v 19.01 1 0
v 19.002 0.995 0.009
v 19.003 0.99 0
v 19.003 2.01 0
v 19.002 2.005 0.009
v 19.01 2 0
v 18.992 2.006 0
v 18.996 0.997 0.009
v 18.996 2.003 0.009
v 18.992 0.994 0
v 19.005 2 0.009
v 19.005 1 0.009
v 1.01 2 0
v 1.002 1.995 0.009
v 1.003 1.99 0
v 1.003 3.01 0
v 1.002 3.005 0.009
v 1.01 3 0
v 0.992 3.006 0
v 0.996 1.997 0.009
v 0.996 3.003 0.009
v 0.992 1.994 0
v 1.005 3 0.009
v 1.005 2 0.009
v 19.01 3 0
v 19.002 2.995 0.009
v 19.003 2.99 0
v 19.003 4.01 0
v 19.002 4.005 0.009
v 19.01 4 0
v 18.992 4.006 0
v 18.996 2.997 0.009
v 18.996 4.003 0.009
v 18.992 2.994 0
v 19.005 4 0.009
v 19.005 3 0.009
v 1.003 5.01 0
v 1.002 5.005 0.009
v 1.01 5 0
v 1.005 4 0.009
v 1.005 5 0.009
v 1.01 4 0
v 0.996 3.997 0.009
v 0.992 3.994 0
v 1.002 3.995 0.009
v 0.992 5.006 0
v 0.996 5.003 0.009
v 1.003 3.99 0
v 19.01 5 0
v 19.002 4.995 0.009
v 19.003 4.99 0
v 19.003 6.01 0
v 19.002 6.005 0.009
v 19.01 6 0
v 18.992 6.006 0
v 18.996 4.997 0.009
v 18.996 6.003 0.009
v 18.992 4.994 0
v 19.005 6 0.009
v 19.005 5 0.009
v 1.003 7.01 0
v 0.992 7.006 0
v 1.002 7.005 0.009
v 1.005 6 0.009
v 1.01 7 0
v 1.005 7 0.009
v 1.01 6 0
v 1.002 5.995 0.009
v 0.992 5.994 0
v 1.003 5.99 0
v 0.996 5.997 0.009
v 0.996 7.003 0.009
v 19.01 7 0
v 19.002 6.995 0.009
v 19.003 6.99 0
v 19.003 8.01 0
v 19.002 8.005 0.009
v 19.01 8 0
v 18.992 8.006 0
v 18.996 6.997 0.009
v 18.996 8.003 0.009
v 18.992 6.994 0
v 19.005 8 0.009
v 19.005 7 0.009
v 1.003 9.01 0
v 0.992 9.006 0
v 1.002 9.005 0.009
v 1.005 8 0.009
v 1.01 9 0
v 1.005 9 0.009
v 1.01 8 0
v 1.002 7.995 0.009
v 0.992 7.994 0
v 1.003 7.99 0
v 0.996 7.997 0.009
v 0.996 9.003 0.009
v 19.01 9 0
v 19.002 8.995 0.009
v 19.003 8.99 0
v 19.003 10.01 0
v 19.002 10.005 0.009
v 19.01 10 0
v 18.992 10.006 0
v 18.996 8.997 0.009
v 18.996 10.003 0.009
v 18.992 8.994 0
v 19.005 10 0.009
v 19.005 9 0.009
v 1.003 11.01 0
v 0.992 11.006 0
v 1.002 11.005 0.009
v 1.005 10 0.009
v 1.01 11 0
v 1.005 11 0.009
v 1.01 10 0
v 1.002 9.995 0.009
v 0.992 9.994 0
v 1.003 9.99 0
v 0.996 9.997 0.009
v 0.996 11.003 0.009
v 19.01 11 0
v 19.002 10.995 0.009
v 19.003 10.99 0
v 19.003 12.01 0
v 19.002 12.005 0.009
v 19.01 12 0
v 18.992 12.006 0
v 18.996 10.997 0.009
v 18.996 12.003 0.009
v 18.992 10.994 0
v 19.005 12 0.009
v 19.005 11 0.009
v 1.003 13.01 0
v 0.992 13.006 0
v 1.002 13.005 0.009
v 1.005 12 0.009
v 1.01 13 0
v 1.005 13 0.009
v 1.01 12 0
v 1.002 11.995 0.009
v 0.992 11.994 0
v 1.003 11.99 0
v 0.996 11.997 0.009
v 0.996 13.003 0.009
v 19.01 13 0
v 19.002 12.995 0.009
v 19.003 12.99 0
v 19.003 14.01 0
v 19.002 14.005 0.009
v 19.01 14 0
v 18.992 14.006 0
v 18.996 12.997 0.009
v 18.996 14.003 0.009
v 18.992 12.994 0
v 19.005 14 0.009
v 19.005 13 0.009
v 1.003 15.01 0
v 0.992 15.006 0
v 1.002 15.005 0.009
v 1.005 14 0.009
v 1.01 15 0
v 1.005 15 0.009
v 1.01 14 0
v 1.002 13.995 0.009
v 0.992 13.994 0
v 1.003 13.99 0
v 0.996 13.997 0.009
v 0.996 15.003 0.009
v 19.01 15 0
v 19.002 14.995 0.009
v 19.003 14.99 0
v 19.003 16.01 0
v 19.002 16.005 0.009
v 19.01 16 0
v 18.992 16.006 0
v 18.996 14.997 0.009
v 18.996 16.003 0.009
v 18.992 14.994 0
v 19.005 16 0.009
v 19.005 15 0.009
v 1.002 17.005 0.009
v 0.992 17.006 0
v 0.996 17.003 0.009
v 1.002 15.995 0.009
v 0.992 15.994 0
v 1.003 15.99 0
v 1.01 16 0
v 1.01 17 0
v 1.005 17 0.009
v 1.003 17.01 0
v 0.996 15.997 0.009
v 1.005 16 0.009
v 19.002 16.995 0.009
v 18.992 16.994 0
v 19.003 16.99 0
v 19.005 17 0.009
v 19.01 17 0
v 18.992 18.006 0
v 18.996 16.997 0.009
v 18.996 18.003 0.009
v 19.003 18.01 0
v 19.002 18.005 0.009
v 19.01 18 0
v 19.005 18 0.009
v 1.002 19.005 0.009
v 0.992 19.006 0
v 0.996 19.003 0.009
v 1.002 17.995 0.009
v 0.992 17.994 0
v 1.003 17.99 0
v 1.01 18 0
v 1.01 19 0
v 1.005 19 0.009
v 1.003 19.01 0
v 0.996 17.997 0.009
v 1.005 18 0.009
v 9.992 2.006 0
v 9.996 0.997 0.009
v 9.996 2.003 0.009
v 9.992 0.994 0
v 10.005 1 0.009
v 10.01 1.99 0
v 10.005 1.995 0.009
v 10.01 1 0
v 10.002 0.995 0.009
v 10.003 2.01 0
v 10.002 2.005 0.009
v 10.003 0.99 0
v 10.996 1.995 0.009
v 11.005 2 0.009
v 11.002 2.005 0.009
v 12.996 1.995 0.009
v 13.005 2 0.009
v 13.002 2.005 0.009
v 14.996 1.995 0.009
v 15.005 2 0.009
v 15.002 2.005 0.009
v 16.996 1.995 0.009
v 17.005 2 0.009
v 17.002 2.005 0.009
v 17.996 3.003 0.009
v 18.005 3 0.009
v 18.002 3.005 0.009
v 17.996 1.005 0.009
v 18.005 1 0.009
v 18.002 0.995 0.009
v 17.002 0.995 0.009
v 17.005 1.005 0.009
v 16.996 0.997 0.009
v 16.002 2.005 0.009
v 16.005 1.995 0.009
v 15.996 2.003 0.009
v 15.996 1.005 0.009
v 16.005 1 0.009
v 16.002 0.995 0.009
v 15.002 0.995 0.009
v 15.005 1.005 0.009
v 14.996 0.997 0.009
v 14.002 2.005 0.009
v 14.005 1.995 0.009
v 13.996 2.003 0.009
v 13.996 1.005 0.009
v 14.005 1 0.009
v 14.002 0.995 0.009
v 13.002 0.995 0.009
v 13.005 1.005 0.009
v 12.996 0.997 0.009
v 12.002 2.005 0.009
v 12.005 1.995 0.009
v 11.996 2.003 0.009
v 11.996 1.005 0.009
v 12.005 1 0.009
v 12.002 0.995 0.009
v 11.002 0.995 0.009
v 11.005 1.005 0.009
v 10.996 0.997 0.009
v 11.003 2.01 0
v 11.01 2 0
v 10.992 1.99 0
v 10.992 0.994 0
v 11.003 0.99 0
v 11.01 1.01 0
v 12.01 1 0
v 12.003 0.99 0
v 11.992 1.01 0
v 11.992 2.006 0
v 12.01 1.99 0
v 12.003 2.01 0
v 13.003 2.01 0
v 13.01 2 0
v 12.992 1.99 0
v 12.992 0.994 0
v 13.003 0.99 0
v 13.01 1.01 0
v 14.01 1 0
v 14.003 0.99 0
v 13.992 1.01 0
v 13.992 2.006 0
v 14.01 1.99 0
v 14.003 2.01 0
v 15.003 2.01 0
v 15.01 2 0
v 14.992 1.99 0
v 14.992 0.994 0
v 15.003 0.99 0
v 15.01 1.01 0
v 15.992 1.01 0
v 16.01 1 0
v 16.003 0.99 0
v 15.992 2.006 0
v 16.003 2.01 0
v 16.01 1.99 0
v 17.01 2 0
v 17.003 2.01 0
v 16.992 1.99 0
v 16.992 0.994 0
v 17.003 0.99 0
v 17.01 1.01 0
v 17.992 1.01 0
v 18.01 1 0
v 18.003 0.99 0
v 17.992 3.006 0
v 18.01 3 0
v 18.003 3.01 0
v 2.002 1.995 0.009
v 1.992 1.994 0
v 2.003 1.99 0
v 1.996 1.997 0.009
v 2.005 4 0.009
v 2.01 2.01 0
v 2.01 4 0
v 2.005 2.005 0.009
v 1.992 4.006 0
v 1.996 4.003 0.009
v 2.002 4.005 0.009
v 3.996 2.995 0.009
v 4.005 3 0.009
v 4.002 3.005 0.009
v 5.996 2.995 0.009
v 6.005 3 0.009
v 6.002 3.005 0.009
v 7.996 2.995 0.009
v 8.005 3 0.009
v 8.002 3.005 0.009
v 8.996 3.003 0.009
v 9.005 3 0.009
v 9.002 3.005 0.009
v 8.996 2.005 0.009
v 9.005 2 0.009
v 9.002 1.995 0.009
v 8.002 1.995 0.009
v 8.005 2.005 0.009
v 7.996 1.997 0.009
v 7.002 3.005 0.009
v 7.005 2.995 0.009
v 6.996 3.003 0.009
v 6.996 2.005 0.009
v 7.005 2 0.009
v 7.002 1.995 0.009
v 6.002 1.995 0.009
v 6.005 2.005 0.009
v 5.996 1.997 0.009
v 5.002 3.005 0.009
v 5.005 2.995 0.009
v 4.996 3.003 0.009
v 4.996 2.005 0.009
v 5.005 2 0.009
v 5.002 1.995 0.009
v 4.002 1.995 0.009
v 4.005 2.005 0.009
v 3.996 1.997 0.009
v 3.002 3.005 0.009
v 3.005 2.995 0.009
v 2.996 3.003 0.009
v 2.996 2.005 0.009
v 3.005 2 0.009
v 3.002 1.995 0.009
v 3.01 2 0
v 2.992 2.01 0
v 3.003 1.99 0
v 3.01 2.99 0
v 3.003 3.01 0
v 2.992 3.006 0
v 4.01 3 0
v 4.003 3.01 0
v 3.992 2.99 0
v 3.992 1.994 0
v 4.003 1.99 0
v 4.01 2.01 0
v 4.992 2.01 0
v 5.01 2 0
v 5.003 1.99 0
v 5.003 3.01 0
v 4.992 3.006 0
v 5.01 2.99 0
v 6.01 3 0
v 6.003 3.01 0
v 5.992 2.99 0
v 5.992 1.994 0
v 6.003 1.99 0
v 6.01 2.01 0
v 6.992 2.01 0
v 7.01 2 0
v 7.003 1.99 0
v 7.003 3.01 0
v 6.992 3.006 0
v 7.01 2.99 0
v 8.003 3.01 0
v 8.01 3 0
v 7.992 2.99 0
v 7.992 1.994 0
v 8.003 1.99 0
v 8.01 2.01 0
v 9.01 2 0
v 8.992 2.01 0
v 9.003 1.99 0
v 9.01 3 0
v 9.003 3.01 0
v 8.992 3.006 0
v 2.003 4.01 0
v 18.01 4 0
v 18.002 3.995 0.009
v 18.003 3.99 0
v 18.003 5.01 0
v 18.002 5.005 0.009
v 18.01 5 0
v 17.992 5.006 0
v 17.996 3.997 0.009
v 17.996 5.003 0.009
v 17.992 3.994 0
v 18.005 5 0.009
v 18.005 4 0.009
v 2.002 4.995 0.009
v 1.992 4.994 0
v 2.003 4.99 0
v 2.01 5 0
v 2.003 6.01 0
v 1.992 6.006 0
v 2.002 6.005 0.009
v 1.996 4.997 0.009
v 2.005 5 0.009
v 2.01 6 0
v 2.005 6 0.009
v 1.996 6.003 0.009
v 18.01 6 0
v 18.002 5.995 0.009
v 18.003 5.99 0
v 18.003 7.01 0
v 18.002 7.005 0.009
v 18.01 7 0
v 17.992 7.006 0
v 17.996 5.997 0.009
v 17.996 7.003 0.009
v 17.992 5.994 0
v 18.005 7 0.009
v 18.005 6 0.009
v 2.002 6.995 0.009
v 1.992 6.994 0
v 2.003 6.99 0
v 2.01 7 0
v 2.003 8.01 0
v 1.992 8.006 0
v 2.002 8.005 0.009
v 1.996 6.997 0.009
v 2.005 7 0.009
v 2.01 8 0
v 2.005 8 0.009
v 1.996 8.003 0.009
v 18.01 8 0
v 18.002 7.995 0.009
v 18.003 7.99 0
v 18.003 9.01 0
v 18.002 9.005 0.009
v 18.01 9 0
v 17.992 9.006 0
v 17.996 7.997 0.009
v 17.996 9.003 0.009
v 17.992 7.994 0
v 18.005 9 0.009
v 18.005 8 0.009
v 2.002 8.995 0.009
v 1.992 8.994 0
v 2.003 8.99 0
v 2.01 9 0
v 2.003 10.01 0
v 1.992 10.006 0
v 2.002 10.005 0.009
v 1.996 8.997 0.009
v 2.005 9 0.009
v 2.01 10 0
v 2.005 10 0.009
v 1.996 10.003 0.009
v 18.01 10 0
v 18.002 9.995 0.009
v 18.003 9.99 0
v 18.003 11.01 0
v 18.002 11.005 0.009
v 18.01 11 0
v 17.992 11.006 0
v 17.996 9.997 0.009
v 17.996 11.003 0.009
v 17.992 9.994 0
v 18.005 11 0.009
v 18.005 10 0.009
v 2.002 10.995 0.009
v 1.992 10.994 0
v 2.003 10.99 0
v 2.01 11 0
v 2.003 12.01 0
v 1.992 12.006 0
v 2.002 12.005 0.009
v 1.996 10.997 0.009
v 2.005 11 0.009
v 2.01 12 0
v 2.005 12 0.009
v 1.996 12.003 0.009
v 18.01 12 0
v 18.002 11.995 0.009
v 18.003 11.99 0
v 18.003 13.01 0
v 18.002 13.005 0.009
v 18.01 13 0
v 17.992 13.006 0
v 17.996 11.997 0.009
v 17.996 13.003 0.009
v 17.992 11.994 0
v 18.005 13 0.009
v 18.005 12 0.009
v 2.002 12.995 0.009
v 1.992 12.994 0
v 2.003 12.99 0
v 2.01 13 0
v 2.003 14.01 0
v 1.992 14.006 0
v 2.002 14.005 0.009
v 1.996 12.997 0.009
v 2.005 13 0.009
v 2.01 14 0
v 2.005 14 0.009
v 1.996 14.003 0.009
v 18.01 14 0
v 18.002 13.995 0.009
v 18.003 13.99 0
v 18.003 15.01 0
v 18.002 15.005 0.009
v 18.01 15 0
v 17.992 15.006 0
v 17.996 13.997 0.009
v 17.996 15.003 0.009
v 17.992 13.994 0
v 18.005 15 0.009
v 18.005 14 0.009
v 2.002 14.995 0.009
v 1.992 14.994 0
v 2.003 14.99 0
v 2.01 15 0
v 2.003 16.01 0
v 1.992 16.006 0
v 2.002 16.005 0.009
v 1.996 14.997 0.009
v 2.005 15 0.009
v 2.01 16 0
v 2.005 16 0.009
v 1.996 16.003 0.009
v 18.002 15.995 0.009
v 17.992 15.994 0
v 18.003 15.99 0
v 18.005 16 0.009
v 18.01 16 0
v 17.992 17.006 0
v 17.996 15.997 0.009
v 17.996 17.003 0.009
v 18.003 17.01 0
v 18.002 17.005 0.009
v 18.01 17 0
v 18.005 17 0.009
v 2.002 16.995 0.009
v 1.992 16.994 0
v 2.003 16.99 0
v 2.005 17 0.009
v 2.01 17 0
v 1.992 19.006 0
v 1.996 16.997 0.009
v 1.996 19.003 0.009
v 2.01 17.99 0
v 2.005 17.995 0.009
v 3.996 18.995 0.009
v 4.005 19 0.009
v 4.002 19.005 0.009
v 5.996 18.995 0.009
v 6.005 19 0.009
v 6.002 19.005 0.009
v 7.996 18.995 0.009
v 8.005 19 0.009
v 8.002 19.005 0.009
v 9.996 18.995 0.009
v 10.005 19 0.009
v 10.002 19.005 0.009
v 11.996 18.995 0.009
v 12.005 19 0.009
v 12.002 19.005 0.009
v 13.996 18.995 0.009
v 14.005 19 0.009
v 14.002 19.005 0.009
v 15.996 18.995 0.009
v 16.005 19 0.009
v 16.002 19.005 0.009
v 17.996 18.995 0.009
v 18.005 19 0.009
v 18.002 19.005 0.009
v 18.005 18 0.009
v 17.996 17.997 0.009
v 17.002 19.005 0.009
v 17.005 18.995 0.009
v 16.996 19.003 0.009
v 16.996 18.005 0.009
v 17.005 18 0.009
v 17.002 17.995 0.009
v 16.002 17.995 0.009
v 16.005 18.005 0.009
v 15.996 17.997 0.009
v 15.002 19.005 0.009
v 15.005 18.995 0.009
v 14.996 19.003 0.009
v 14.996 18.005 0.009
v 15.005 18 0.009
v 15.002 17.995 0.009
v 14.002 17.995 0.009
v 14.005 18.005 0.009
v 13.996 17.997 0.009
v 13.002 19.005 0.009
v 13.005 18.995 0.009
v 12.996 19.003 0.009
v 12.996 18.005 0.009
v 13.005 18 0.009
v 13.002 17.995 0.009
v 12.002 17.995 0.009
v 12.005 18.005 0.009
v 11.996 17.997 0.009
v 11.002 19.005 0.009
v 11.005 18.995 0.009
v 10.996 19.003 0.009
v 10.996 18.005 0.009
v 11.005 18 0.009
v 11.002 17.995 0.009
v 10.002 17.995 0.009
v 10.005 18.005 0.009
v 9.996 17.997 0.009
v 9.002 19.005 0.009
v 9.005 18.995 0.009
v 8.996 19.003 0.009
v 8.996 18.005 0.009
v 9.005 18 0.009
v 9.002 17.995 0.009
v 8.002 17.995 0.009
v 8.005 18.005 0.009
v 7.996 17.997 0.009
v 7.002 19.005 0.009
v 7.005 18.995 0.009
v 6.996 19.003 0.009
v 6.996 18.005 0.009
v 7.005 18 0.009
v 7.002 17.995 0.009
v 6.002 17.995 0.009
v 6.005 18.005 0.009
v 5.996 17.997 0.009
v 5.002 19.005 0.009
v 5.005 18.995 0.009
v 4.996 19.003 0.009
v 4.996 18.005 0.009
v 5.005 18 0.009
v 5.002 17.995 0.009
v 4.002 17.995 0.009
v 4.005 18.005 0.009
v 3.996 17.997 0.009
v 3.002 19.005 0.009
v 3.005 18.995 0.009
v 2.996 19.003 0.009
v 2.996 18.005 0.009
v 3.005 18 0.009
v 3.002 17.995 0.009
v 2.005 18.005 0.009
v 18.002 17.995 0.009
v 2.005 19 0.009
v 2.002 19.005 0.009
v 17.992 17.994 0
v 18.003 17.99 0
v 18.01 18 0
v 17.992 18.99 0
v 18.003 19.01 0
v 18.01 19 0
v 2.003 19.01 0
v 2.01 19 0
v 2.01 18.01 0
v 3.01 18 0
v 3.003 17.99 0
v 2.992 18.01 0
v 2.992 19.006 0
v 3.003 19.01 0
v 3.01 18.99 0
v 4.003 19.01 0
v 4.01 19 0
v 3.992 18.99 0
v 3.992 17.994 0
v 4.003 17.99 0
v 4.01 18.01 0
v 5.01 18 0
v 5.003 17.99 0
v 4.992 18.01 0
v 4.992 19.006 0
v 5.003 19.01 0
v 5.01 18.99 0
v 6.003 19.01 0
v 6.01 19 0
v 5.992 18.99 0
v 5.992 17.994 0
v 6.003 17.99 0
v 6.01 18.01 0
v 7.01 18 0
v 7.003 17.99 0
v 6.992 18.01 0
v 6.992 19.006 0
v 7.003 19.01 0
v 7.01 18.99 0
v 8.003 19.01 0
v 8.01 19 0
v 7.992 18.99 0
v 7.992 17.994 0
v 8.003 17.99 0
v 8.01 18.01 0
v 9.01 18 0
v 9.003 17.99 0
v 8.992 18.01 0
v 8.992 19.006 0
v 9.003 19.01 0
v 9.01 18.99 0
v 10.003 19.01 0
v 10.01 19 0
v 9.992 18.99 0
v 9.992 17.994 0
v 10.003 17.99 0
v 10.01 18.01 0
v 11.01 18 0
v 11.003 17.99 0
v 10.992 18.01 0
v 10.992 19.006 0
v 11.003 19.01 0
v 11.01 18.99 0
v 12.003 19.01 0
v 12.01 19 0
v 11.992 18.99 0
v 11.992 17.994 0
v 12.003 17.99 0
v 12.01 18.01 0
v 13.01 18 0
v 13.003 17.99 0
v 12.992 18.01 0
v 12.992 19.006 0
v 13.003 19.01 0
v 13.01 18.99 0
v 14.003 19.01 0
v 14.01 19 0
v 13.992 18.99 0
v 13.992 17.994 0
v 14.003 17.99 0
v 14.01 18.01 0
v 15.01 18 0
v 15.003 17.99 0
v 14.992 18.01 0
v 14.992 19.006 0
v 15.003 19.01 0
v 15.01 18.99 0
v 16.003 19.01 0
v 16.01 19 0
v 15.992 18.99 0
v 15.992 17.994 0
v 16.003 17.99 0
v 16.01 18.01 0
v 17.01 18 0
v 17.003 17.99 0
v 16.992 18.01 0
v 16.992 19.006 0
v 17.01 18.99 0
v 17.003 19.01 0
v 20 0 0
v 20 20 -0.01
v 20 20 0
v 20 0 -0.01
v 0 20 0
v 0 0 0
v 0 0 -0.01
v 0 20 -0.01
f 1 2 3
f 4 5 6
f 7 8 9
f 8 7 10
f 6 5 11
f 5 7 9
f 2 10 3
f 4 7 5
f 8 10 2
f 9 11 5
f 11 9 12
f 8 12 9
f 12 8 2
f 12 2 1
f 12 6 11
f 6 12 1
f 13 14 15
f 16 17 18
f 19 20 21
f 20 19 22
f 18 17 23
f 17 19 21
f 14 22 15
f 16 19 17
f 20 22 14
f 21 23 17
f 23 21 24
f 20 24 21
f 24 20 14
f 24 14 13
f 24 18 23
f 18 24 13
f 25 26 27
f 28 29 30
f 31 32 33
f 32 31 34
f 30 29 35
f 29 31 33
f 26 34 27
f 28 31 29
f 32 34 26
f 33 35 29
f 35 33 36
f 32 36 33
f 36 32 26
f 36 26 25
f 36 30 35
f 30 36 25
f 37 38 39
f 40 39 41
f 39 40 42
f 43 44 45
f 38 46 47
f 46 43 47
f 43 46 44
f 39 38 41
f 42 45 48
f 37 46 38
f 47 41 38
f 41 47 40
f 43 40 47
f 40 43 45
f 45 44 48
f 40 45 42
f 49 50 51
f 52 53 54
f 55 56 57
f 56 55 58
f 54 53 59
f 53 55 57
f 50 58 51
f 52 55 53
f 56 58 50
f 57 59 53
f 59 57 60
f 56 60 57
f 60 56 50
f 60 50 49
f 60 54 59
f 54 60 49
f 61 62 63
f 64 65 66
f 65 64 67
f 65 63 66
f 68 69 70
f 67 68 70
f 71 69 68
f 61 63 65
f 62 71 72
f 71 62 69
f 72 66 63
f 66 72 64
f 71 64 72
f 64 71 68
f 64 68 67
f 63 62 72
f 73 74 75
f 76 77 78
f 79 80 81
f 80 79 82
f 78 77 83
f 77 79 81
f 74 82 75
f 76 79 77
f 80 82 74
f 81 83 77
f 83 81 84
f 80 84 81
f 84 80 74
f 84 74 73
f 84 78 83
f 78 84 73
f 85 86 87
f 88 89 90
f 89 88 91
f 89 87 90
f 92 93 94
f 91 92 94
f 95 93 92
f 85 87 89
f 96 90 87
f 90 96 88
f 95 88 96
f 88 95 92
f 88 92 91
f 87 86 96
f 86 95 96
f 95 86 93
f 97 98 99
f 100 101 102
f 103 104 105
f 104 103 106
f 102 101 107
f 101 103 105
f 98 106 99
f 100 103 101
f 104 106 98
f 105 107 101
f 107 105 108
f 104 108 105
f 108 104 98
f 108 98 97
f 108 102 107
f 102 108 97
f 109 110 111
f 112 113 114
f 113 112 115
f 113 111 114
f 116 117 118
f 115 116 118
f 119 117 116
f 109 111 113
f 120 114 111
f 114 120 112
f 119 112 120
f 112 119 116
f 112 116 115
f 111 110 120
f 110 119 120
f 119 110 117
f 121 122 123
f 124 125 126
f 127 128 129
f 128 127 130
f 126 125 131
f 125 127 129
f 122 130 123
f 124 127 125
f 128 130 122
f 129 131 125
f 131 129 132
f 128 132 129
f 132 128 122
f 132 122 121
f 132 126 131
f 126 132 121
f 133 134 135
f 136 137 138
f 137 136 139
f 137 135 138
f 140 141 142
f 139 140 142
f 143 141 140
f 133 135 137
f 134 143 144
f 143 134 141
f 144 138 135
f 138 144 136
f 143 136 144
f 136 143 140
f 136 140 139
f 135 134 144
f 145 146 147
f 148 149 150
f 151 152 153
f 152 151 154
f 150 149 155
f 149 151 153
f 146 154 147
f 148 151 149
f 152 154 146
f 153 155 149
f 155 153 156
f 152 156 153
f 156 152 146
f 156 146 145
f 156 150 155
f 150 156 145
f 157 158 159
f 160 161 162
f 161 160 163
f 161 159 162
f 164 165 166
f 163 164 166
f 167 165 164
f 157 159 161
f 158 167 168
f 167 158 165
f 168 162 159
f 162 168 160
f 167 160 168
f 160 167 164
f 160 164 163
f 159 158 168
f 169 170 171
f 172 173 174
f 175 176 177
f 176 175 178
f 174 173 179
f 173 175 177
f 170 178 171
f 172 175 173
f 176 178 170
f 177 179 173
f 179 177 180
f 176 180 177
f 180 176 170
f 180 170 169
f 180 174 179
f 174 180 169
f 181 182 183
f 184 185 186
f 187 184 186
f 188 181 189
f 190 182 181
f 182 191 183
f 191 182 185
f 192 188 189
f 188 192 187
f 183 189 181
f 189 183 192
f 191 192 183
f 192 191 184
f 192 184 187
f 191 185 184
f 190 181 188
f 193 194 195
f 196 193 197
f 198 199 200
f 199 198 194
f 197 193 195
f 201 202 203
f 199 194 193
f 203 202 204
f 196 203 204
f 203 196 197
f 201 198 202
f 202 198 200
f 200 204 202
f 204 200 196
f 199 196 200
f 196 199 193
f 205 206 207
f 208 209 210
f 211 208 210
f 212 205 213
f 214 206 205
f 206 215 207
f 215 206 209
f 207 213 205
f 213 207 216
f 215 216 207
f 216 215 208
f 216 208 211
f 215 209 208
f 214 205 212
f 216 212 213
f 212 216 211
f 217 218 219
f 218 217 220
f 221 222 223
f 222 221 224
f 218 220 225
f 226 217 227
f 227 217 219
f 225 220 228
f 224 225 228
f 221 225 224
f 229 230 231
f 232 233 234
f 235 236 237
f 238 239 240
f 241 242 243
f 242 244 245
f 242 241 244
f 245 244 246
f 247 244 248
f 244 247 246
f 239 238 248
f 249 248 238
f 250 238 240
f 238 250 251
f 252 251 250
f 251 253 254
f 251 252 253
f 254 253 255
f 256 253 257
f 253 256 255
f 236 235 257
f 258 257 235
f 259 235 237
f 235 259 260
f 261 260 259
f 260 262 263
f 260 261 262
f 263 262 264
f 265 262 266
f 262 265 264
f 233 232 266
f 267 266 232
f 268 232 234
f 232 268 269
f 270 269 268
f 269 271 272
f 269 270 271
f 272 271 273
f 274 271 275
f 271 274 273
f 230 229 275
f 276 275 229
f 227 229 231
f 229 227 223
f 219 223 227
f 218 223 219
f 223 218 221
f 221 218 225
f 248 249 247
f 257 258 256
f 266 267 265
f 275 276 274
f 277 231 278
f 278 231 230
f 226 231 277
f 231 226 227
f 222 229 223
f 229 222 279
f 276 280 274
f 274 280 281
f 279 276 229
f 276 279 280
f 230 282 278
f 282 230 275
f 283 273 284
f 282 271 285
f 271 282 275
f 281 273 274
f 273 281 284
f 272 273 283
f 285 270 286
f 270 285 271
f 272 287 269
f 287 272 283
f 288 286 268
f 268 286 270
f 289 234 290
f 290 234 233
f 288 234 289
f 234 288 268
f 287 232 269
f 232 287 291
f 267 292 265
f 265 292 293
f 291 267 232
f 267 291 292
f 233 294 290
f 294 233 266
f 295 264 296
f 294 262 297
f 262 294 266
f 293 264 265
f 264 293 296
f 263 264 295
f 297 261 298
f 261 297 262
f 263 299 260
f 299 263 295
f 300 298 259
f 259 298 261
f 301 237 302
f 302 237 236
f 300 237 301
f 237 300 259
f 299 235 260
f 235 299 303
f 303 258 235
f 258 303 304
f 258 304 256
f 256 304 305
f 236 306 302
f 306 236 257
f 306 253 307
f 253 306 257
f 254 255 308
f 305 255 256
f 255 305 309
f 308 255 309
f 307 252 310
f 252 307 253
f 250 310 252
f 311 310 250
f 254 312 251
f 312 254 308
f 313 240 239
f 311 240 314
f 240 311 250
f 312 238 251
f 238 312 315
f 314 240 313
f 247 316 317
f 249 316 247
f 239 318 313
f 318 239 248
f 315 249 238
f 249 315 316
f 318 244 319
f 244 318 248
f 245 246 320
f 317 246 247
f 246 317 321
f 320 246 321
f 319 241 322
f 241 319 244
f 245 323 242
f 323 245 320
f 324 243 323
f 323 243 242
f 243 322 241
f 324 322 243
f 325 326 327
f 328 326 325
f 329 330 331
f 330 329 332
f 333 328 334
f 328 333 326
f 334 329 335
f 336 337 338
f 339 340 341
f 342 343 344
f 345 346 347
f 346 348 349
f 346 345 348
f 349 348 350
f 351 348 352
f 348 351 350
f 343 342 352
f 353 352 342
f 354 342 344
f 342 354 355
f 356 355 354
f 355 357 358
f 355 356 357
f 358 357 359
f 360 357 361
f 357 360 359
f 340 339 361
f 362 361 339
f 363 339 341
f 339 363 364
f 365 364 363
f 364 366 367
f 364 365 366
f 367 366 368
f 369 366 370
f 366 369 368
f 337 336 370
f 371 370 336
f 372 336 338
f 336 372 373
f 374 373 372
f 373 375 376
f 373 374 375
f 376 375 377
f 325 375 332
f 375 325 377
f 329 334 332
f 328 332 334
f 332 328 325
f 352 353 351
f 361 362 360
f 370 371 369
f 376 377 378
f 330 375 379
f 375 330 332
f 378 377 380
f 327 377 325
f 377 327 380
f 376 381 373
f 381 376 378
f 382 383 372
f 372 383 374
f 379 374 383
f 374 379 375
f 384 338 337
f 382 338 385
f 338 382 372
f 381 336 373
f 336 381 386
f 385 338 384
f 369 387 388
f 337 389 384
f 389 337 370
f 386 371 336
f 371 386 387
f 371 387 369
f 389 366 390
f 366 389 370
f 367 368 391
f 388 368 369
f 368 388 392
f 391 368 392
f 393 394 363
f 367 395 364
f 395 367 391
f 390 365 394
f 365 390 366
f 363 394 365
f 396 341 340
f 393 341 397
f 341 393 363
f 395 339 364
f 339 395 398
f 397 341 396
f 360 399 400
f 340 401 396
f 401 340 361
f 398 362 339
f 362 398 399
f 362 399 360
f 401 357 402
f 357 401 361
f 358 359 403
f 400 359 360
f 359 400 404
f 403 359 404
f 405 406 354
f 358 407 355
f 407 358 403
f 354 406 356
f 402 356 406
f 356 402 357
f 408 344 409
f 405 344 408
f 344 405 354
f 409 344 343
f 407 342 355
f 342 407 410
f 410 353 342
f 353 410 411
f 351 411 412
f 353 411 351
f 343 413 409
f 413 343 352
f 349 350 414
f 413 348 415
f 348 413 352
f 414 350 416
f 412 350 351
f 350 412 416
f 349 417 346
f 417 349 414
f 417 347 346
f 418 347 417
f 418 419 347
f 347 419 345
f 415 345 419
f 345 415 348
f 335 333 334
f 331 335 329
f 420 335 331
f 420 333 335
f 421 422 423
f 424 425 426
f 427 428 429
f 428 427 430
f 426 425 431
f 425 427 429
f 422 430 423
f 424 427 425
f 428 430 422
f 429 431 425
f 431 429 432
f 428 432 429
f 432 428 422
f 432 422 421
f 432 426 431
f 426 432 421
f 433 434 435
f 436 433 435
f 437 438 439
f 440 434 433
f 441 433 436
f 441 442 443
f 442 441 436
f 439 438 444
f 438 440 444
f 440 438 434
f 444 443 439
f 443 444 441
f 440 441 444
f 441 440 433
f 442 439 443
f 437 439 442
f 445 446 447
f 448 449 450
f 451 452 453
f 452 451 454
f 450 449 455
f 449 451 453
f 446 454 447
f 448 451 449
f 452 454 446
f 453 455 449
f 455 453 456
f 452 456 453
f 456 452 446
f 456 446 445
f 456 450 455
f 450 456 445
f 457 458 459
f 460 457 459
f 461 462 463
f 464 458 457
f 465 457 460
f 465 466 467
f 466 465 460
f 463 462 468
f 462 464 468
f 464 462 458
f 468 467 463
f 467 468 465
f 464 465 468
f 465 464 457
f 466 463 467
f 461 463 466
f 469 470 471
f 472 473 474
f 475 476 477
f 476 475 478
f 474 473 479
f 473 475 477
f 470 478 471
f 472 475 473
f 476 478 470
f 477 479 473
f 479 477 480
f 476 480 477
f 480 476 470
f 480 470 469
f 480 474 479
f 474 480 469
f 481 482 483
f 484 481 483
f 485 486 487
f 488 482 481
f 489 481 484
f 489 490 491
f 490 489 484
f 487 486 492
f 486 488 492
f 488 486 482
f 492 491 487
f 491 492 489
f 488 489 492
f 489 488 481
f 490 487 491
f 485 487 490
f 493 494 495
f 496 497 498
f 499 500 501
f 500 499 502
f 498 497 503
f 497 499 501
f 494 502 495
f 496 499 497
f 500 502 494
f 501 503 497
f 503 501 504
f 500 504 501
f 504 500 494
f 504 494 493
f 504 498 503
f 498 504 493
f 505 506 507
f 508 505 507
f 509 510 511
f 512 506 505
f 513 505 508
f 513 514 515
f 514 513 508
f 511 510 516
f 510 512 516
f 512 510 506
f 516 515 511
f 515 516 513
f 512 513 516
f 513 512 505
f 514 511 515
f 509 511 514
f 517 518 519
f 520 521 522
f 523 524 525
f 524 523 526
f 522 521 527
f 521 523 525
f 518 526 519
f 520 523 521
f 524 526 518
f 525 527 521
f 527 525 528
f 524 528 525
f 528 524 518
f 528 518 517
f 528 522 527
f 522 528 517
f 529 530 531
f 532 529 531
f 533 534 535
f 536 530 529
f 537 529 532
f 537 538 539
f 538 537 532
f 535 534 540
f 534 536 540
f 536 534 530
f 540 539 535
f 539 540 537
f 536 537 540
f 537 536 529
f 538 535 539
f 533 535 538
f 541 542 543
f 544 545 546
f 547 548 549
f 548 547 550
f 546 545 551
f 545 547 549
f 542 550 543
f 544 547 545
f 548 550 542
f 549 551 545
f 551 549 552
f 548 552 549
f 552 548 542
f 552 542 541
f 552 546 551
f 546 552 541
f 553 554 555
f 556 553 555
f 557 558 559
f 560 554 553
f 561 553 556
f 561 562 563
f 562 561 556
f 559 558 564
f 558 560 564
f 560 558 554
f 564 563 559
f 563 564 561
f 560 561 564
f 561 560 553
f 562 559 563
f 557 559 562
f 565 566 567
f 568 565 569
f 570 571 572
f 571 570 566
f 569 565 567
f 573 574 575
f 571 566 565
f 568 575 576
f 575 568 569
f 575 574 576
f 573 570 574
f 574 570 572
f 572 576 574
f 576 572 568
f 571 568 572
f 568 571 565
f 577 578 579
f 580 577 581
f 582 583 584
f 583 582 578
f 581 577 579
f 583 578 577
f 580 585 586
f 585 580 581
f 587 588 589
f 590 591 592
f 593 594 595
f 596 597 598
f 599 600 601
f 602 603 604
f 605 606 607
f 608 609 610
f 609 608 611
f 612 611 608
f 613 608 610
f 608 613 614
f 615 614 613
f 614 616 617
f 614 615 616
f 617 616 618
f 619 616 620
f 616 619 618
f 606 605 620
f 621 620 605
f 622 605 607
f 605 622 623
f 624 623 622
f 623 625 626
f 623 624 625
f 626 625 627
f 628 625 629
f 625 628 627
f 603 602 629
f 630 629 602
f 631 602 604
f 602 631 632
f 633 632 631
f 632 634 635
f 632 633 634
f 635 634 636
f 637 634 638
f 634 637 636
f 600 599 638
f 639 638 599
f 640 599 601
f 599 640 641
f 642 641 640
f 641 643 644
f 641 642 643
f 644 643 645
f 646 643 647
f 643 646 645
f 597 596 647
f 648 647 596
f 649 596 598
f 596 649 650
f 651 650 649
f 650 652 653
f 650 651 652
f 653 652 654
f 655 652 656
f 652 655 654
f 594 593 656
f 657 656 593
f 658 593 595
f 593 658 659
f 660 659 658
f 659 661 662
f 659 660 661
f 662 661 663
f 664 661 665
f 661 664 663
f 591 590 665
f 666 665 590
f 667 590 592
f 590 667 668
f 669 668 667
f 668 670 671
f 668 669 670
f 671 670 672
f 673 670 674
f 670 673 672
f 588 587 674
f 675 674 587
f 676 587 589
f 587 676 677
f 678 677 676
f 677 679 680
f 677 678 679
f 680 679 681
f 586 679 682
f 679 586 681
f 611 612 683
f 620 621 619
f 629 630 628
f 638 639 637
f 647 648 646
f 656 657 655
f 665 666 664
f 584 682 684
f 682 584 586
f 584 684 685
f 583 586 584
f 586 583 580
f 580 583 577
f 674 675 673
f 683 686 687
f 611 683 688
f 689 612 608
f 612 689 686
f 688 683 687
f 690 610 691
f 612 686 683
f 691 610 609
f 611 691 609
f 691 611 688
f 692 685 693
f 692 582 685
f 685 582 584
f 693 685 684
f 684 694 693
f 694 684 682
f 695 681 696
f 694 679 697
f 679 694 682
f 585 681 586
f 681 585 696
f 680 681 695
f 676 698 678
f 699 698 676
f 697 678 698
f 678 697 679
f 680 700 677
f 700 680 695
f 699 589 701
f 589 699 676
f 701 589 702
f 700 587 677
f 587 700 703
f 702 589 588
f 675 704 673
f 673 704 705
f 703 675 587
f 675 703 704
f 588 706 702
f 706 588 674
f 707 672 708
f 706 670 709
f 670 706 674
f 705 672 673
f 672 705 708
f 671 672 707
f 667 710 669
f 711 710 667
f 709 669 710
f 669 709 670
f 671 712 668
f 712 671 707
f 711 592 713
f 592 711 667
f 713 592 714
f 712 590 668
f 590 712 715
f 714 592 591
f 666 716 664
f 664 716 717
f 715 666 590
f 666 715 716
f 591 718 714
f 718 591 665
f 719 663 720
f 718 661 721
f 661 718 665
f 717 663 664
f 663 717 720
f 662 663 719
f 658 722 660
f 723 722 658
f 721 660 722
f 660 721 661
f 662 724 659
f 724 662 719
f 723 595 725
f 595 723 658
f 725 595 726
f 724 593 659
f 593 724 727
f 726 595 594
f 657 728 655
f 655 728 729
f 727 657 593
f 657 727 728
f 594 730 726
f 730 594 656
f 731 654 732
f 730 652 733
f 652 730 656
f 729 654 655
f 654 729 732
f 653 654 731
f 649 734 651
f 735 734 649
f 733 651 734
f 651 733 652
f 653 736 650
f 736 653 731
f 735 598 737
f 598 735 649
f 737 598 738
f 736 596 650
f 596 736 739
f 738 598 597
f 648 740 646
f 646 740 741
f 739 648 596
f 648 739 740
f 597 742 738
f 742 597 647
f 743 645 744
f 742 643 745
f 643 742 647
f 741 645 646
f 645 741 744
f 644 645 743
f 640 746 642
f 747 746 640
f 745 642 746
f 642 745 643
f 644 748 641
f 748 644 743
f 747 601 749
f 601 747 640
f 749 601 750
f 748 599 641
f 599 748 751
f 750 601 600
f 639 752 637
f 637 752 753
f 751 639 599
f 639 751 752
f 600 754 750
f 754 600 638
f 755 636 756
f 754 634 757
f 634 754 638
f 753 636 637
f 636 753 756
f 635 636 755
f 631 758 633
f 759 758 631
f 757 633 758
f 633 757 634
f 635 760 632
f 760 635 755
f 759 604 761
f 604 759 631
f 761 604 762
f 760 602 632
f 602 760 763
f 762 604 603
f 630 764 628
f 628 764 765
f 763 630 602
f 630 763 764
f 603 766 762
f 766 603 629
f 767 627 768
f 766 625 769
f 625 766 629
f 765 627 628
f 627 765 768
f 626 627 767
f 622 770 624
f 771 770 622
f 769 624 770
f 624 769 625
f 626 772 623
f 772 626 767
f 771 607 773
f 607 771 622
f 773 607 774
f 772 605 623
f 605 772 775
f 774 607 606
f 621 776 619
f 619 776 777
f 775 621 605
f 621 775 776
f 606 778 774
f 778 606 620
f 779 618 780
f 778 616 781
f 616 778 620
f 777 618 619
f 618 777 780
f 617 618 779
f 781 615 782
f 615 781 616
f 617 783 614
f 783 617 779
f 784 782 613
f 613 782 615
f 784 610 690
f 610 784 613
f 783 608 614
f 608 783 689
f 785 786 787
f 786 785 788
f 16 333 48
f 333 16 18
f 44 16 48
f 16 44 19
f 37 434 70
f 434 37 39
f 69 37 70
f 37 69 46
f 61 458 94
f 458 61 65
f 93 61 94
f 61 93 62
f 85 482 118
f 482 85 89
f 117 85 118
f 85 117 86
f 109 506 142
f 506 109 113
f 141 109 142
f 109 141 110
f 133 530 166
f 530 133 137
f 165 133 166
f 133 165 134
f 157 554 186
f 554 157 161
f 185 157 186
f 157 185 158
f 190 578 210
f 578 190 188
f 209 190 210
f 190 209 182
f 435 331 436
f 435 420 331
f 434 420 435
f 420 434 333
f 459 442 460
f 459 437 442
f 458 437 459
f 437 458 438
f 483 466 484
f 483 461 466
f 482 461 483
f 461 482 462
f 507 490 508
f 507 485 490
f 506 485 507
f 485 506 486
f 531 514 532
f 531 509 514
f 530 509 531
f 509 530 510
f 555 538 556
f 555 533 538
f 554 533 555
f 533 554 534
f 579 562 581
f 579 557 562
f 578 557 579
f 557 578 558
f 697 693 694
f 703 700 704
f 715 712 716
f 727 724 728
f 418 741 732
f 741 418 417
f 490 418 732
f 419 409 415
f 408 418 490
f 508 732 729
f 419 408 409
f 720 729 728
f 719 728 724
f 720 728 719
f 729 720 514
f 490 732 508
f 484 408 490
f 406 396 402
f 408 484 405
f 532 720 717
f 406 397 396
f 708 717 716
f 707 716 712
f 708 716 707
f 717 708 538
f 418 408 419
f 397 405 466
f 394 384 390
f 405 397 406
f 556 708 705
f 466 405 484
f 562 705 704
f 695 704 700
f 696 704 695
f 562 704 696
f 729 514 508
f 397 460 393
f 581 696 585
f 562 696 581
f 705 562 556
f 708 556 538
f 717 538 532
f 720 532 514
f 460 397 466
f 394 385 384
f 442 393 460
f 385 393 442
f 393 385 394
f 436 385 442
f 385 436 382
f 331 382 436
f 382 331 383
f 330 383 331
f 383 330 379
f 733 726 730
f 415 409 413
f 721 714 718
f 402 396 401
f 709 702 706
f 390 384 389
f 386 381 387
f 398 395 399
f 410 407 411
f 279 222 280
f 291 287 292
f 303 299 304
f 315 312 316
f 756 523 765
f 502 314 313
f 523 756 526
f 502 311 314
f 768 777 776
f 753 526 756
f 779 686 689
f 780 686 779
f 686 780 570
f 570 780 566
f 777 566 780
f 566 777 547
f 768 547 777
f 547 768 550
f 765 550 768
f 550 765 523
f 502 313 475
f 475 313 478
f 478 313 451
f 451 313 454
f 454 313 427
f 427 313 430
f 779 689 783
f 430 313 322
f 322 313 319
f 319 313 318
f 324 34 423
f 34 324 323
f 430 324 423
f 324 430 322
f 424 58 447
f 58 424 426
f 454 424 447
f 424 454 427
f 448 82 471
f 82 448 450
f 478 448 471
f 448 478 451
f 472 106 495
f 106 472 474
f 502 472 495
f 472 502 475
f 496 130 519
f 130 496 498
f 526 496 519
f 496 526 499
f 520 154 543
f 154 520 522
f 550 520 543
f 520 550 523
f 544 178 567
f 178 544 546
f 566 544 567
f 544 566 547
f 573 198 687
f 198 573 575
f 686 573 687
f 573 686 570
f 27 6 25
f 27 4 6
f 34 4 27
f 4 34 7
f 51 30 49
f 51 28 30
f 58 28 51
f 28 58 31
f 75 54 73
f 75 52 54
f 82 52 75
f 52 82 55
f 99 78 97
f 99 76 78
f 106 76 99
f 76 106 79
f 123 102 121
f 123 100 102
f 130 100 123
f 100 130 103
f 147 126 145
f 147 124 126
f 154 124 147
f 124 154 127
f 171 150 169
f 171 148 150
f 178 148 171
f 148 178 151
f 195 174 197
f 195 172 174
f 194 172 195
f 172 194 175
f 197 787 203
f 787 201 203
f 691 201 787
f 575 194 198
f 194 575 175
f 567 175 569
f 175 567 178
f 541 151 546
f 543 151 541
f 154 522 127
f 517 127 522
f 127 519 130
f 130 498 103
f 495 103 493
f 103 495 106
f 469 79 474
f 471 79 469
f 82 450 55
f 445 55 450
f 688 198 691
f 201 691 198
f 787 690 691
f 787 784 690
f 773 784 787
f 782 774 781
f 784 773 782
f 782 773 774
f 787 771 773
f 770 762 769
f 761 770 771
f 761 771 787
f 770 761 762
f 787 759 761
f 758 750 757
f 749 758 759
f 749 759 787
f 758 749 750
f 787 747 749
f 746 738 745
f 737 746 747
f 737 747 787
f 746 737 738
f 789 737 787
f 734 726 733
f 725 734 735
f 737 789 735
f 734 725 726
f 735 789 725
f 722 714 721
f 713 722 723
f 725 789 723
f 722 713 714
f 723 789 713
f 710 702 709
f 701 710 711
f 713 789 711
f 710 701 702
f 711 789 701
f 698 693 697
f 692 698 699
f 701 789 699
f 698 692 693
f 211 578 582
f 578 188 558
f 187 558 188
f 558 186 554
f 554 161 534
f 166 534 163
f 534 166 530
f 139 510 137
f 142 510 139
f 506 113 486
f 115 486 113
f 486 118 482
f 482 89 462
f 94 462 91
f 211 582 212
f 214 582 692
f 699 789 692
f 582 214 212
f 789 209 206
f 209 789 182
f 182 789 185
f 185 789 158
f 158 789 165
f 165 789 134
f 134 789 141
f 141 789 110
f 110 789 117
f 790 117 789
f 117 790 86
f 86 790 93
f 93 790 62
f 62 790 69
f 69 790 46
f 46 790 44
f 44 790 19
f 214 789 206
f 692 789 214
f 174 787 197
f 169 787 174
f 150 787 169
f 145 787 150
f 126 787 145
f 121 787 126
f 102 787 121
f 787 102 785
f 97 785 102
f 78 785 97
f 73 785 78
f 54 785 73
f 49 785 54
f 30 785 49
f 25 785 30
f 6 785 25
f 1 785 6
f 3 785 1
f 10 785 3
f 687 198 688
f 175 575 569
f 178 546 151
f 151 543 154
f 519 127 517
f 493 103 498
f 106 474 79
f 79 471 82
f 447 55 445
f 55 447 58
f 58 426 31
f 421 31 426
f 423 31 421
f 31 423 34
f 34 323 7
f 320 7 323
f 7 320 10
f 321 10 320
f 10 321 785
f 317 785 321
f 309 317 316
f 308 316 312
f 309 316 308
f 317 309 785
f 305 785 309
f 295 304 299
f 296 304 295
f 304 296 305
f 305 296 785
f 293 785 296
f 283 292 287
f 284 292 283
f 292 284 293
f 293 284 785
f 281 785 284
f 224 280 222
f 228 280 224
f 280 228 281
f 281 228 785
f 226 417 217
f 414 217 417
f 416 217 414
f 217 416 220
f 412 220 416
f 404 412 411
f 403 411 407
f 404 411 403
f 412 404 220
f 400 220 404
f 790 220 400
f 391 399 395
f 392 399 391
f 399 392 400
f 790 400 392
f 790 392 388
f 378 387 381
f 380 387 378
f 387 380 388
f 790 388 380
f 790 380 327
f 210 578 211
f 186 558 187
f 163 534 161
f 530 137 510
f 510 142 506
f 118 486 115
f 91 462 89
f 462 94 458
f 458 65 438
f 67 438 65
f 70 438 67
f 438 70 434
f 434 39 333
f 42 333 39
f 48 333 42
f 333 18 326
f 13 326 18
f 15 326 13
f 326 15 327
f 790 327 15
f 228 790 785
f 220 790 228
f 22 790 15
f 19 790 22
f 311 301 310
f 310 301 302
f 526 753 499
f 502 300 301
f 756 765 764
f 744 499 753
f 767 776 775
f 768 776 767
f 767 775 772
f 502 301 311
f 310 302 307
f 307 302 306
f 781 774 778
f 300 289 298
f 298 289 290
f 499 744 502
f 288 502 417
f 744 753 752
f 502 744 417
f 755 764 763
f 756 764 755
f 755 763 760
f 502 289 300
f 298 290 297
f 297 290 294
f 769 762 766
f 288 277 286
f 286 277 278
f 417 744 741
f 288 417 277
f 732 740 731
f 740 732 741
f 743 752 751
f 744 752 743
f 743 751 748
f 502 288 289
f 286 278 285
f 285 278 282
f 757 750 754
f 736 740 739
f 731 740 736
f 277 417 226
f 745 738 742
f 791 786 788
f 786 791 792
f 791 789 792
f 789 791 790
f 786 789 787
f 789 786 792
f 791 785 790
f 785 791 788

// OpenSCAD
hull(){
    translate([19, 1]) sphere(0.01);
    translate([19, 2]) sphere(0.01);
}
hull(){
    translate([1, 2]) sphere(0.01);
    translate([1, 3]) sphere(0.01);
}
hull(){
    translate([19, 3]) sphere(0.01);
    translate([19, 4]) sphere(0.01);
}
hull(){
    translate([1, 4]) sphere(0.01);
    translate([1, 5]) sphere(0.01);
}
hull(){
    translate([19, 5]) sphere(0.01);
    translate([19, 6]) sphere(0.01);
}
hull(){
    translate([1, 6]) sphere(0.01);
    translate([1, 7]) sphere(0.01);
}
hull(){
    translate([19, 7]) sphere(0.01);
    translate([19, 8]) sphere(0.01);
}
hull(){
    translate([1, 8]) sphere(0.01);
    translate([1, 9]) sphere(0.01);
}
hull(){
    translate([19, 9]) sphere(0.01);
    translate([19, 10]) sphere(0.01);
}
hull(){
    translate([1, 10]) sphere(0.01);
    translate([1, 11]) sphere(0.01);
}
hull(){
    translate([19, 11]) sphere(0.01);
    translate([19, 12]) sphere(0.01);
}
hull(){
    translate([1, 12]) sphere(0.01);
    translate([1, 13]) sphere(0.01);
}
hull(){
    translate([19, 13]) sphere(0.01);
    translate([19, 14]) sphere(0.01);
}
hull(){
    translate([1, 14]) sphere(0.01);
    translate([1, 15]) sphere(0.01);
}
hull(){
    translate([19, 15]) sphere(0.01);
    translate([19, 16]) sphere(0.01);
}
hull(){
    translate([1, 16]) sphere(0.01);
    translate([1, 17]) sphere(0.01);
}
hull(){
    translate([19, 17]) sphere(0.01);
    translate([19, 18]) sphere(0.01);
}
hull(){
    translate([1, 18]) sphere(0.01);
    translate([1, 19]) sphere(0.01);
}
hull(){
    translate([10, 1]) sphere(0.01);
    translate([10, 2]) sphere(0.01);
}
hull(){
    translate([10, 2]) sphere(0.01);
    translate([11, 2]) sphere(0.01);
}
hull(){
    translate([11, 2]) sphere(0.01);
    translate([11, 1]) sphere(0.01);
}
hull(){
    translate([11, 1]) sphere(0.01);
    translate([12, 1]) sphere(0.01);
}
hull(){
    translate([12, 1]) sphere(0.01);
    translate([12, 2]) sphere(0.01);
}
hull(){
    translate([12, 2]) sphere(0.01);
    translate([13, 2]) sphere(0.01);
}
hull(){
    translate([13, 2]) sphere(0.01);
    translate([13, 1]) sphere(0.01);
}
hull(){
    translate([13, 1]) sphere(0.01);
    translate([14, 1]) sphere(0.01);
}
hull(){
    translate([14, 1]) sphere(0.01);
    translate([14, 2]) sphere(0.01);
}
hull(){
    translate([14, 2]) sphere(0.01);
    translate([15, 2]) sphere(0.01);
}
hull(){
    translate([15, 2]) sphere(0.01);
    translate([15, 1]) sphere(0.01);
}
hull(){
    translate([15, 1]) sphere(0.01);
    translate([16, 1]) sphere(0.01);
}
hull(){
    translate([16, 1]) sphere(0.01);
    translate([16, 2]) sphere(0.01);
}
hull(){
    translate([16, 2]) sphere(0.01);
    translate([17, 2]) sphere(0.01);
}
hull(){
    translate([17, 2]) sphere(0.01);
    translate([17, 1]) sphere(0.01);
}
hull(){
    translate([17, 1]) sphere(0.01);
    translate([18, 1]) sphere(0.01);
}
hull(){
    translate([18, 1]) sphere(0.01);
    translate([18, 2]) sphere(0.01);
}
hull(){
    translate([18, 2]) sphere(0.01);
    translate([18, 3]) sphere(0.01);
}
hull(){
    translate([2, 3]) sphere(0.01);
    translate([2, 2]) sphere(0.01);
}
hull(){
    translate([2, 2]) sphere(0.01);
    translate([3, 2]) sphere(0.01);
}
hull(){
    translate([3, 2]) sphere(0.01);
    translate([3, 3]) sphere(0.01);
}
hull(){
    translate([3, 3]) sphere(0.01);
    translate([4, 3]) sphere(0.01);
}
hull(){
    translate([4, 3]) sphere(0.01);
    translate([4, 2]) sphere(0.01);
}
hull(){
    translate([4, 2]) sphere(0.01);
    translate([5, 2]) sphere(0.01);
}
hull(){
    translate([5, 2]) sphere(0.01);
    translate([5, 3]) sphere(0.01);
}
hull(){
    translate([5, 3]) sphere(0.01);
    translate([6, 3]) sphere(0.01);
}
hull(){
    translate([6, 3]) sphere(0.01);
    translate([6, 2]) sphere(0.01);
}
hull(){
    translate([6, 2]) sphere(0.01);
    translate([7, 2]) sphere(0.01);
}
hull(){
    translate([7, 2]) sphere(0.01);
    translate([7, 3]) sphere(0.01);
}
hull(){
    translate([7, 3]) sphere(0.01);
    translate([8, 3]) sphere(0.01);
}
hull(){
    translate([8, 3]) sphere(0.01);
    translate([8, 2]) sphere(0.01);
}
hull(){
    translate([8, 2]) sphere(0.01);
    translate([9, 2]) sphere(0.01);
}
hull(){
    translate([9, 2]) sphere(0.01);
    translate([9, 3]) sphere(0.01);
}
hull(){
    translate([2, 3]) sphere(0.01);
    translate([2, 4]) sphere(0.01);
}
hull(){
    translate([18, 4]) sphere(0.01);
    translate([18, 5]) sphere(0.01);
}
hull(){
    translate([2, 5]) sphere(0.01);
    translate([2, 6]) sphere(0.01);
}
hull(){
    translate([18, 6]) sphere(0.01);
    translate([18, 7]) sphere(0.01);
}
hull(){
    translate([2, 7]) sphere(0.01);
    translate([2, 8]) sphere(0.01);
}
hull(){
    translate([18, 8]) sphere(0.01);
    translate([18, 9]) sphere(0.01);
}
hull(){
    translate([2, 9]) sphere(0.01);
    translate([2, 10]) sphere(0.01);
}
hull(){
    translate([18, 10]) sphere(0.01);
    translate([18, 11]) sphere(0.01);
}
hull(){
    translate([2, 11]) sphere(0.01);
    translate([2, 12]) sphere(0.01);
}
hull(){
    translate([18, 12]) sphere(0.01);
    translate([18, 13]) sphere(0.01);
}
hull(){
    translate([2, 13]) sphere(0.01);
    translate([2, 14]) sphere(0.01);
}
hull(){
    translate([18, 14]) sphere(0.01);
    translate([18, 15]) sphere(0.01);
}
hull(){
    translate([2, 15]) sphere(0.01);
    translate([2, 16]) sphere(0.01);
}
hull(){
    translate([18, 16]) sphere(0.01);
    translate([18, 17]) sphere(0.01);
}
hull(){
    translate([2, 17]) sphere(0.01);
    translate([2, 18]) sphere(0.01);
}
hull(){
    translate([18, 18]) sphere(0.01);
    translate([18, 19]) sphere(0.01);
}
hull(){
    translate([2, 19]) sphere(0.01);
    translate([2, 18]) sphere(0.01);
}
hull(){
    translate([2, 18]) sphere(0.01);
    translate([3, 18]) sphere(0.01);
}
hull(){
    translate([3, 18]) sphere(0.01);
    translate([3, 19]) sphere(0.01);
}
hull(){
    translate([3, 19]) sphere(0.01);
    translate([4, 19]) sphere(0.01);
}
hull(){
    translate([4, 19]) sphere(0.01);
    translate([4, 18]) sphere(0.01);
}
hull(){
    translate([4, 18]) sphere(0.01);
    translate([5, 18]) sphere(0.01);
}
hull(){
    translate([5, 18]) sphere(0.01);
    translate([5, 19]) sphere(0.01);
}
hull(){
    translate([5, 19]) sphere(0.01);
    translate([6, 19]) sphere(0.01);
}
hull(){
    translate([6, 19]) sphere(0.01);
    translate([6, 18]) sphere(0.01);
}
hull(){
    translate([6, 18]) sphere(0.01);
    translate([7, 18]) sphere(0.01);
}
hull(){
    translate([7, 18]) sphere(0.01);
    translate([7, 19]) sphere(0.01);
}
hull(){
    translate([7, 19]) sphere(0.01);
    translate([8, 19]) sphere(0.01);
}
hull(){
    translate([8, 19]) sphere(0.01);
    translate([8, 18]) sphere(0.01);
}
hull(){
    translate([8, 18]) sphere(0.01);
    translate([9, 18]) sphere(0.01);
}
hull(){
    translate([9, 18]) sphere(0.01);
    translate([9, 19]) sphere(0.01);
}
hull(){
    translate([9, 19]) sphere(0.01);
    translate([10, 19]) sphere(0.01);
}
hull(){
    translate([10, 19]) sphere(0.01);
    translate([10, 18]) sphere(0.01);
}
hull(){
    translate([10, 18]) sphere(0.01);
    translate([11, 18]) sphere(0.01);
}
hull(){
    translate([11, 18]) sphere(0.01);
    translate([11, 19]) sphere(0.01);
}
hull(){
    translate([11, 19]) sphere(0.01);
    translate([12, 19]) sphere(0.01);
}
hull(){
    translate([12, 19]) sphere(0.01);
    translate([12, 18]) sphere(0.01);
}
hull(){
    translate([12, 18]) sphere(0.01);
    translate([13, 18]) sphere(0.01);
}
hull(){
    translate([13, 18]) sphere(0.01);
    translate([13, 19]) sphere(0.01);
}
hull(){
    translate([13, 19]) sphere(0.01);
    translate([14, 19]) sphere(0.01);
}
hull(){
    translate([14, 19]) sphere(0.01);
    translate([14, 18]) sphere(0.01);
}
hull(){
    translate([14, 18]) sphere(0.01);
    translate([15, 18]) sphere(0.01);
}
hull(){
    translate([15, 18]) sphere(0.01);
    translate([15, 19]) sphere(0.01);
}
hull(){
    translate([15, 19]) sphere(0.01);
    translate([16, 19]) sphere(0.01);
}
hull(){
    translate([16, 19]) sphere(0.01);
    translate([16, 18]) sphere(0.01);
}
hull(){
    translate([16, 18]) sphere(0.01);
    translate([17, 18]) sphere(0.01);
}
hull(){
    translate([17, 18]) sphere(0.01);
    translate([17, 19]) sphere(0.01);
}
hull(){
    translate([17, 19]) sphere(0.01);
    translate([18, 19]) sphere(0.01);
}
translate([0,0,-0.01]) color([0.1,0.1,0.1]) cube([20,20,0.01]);
